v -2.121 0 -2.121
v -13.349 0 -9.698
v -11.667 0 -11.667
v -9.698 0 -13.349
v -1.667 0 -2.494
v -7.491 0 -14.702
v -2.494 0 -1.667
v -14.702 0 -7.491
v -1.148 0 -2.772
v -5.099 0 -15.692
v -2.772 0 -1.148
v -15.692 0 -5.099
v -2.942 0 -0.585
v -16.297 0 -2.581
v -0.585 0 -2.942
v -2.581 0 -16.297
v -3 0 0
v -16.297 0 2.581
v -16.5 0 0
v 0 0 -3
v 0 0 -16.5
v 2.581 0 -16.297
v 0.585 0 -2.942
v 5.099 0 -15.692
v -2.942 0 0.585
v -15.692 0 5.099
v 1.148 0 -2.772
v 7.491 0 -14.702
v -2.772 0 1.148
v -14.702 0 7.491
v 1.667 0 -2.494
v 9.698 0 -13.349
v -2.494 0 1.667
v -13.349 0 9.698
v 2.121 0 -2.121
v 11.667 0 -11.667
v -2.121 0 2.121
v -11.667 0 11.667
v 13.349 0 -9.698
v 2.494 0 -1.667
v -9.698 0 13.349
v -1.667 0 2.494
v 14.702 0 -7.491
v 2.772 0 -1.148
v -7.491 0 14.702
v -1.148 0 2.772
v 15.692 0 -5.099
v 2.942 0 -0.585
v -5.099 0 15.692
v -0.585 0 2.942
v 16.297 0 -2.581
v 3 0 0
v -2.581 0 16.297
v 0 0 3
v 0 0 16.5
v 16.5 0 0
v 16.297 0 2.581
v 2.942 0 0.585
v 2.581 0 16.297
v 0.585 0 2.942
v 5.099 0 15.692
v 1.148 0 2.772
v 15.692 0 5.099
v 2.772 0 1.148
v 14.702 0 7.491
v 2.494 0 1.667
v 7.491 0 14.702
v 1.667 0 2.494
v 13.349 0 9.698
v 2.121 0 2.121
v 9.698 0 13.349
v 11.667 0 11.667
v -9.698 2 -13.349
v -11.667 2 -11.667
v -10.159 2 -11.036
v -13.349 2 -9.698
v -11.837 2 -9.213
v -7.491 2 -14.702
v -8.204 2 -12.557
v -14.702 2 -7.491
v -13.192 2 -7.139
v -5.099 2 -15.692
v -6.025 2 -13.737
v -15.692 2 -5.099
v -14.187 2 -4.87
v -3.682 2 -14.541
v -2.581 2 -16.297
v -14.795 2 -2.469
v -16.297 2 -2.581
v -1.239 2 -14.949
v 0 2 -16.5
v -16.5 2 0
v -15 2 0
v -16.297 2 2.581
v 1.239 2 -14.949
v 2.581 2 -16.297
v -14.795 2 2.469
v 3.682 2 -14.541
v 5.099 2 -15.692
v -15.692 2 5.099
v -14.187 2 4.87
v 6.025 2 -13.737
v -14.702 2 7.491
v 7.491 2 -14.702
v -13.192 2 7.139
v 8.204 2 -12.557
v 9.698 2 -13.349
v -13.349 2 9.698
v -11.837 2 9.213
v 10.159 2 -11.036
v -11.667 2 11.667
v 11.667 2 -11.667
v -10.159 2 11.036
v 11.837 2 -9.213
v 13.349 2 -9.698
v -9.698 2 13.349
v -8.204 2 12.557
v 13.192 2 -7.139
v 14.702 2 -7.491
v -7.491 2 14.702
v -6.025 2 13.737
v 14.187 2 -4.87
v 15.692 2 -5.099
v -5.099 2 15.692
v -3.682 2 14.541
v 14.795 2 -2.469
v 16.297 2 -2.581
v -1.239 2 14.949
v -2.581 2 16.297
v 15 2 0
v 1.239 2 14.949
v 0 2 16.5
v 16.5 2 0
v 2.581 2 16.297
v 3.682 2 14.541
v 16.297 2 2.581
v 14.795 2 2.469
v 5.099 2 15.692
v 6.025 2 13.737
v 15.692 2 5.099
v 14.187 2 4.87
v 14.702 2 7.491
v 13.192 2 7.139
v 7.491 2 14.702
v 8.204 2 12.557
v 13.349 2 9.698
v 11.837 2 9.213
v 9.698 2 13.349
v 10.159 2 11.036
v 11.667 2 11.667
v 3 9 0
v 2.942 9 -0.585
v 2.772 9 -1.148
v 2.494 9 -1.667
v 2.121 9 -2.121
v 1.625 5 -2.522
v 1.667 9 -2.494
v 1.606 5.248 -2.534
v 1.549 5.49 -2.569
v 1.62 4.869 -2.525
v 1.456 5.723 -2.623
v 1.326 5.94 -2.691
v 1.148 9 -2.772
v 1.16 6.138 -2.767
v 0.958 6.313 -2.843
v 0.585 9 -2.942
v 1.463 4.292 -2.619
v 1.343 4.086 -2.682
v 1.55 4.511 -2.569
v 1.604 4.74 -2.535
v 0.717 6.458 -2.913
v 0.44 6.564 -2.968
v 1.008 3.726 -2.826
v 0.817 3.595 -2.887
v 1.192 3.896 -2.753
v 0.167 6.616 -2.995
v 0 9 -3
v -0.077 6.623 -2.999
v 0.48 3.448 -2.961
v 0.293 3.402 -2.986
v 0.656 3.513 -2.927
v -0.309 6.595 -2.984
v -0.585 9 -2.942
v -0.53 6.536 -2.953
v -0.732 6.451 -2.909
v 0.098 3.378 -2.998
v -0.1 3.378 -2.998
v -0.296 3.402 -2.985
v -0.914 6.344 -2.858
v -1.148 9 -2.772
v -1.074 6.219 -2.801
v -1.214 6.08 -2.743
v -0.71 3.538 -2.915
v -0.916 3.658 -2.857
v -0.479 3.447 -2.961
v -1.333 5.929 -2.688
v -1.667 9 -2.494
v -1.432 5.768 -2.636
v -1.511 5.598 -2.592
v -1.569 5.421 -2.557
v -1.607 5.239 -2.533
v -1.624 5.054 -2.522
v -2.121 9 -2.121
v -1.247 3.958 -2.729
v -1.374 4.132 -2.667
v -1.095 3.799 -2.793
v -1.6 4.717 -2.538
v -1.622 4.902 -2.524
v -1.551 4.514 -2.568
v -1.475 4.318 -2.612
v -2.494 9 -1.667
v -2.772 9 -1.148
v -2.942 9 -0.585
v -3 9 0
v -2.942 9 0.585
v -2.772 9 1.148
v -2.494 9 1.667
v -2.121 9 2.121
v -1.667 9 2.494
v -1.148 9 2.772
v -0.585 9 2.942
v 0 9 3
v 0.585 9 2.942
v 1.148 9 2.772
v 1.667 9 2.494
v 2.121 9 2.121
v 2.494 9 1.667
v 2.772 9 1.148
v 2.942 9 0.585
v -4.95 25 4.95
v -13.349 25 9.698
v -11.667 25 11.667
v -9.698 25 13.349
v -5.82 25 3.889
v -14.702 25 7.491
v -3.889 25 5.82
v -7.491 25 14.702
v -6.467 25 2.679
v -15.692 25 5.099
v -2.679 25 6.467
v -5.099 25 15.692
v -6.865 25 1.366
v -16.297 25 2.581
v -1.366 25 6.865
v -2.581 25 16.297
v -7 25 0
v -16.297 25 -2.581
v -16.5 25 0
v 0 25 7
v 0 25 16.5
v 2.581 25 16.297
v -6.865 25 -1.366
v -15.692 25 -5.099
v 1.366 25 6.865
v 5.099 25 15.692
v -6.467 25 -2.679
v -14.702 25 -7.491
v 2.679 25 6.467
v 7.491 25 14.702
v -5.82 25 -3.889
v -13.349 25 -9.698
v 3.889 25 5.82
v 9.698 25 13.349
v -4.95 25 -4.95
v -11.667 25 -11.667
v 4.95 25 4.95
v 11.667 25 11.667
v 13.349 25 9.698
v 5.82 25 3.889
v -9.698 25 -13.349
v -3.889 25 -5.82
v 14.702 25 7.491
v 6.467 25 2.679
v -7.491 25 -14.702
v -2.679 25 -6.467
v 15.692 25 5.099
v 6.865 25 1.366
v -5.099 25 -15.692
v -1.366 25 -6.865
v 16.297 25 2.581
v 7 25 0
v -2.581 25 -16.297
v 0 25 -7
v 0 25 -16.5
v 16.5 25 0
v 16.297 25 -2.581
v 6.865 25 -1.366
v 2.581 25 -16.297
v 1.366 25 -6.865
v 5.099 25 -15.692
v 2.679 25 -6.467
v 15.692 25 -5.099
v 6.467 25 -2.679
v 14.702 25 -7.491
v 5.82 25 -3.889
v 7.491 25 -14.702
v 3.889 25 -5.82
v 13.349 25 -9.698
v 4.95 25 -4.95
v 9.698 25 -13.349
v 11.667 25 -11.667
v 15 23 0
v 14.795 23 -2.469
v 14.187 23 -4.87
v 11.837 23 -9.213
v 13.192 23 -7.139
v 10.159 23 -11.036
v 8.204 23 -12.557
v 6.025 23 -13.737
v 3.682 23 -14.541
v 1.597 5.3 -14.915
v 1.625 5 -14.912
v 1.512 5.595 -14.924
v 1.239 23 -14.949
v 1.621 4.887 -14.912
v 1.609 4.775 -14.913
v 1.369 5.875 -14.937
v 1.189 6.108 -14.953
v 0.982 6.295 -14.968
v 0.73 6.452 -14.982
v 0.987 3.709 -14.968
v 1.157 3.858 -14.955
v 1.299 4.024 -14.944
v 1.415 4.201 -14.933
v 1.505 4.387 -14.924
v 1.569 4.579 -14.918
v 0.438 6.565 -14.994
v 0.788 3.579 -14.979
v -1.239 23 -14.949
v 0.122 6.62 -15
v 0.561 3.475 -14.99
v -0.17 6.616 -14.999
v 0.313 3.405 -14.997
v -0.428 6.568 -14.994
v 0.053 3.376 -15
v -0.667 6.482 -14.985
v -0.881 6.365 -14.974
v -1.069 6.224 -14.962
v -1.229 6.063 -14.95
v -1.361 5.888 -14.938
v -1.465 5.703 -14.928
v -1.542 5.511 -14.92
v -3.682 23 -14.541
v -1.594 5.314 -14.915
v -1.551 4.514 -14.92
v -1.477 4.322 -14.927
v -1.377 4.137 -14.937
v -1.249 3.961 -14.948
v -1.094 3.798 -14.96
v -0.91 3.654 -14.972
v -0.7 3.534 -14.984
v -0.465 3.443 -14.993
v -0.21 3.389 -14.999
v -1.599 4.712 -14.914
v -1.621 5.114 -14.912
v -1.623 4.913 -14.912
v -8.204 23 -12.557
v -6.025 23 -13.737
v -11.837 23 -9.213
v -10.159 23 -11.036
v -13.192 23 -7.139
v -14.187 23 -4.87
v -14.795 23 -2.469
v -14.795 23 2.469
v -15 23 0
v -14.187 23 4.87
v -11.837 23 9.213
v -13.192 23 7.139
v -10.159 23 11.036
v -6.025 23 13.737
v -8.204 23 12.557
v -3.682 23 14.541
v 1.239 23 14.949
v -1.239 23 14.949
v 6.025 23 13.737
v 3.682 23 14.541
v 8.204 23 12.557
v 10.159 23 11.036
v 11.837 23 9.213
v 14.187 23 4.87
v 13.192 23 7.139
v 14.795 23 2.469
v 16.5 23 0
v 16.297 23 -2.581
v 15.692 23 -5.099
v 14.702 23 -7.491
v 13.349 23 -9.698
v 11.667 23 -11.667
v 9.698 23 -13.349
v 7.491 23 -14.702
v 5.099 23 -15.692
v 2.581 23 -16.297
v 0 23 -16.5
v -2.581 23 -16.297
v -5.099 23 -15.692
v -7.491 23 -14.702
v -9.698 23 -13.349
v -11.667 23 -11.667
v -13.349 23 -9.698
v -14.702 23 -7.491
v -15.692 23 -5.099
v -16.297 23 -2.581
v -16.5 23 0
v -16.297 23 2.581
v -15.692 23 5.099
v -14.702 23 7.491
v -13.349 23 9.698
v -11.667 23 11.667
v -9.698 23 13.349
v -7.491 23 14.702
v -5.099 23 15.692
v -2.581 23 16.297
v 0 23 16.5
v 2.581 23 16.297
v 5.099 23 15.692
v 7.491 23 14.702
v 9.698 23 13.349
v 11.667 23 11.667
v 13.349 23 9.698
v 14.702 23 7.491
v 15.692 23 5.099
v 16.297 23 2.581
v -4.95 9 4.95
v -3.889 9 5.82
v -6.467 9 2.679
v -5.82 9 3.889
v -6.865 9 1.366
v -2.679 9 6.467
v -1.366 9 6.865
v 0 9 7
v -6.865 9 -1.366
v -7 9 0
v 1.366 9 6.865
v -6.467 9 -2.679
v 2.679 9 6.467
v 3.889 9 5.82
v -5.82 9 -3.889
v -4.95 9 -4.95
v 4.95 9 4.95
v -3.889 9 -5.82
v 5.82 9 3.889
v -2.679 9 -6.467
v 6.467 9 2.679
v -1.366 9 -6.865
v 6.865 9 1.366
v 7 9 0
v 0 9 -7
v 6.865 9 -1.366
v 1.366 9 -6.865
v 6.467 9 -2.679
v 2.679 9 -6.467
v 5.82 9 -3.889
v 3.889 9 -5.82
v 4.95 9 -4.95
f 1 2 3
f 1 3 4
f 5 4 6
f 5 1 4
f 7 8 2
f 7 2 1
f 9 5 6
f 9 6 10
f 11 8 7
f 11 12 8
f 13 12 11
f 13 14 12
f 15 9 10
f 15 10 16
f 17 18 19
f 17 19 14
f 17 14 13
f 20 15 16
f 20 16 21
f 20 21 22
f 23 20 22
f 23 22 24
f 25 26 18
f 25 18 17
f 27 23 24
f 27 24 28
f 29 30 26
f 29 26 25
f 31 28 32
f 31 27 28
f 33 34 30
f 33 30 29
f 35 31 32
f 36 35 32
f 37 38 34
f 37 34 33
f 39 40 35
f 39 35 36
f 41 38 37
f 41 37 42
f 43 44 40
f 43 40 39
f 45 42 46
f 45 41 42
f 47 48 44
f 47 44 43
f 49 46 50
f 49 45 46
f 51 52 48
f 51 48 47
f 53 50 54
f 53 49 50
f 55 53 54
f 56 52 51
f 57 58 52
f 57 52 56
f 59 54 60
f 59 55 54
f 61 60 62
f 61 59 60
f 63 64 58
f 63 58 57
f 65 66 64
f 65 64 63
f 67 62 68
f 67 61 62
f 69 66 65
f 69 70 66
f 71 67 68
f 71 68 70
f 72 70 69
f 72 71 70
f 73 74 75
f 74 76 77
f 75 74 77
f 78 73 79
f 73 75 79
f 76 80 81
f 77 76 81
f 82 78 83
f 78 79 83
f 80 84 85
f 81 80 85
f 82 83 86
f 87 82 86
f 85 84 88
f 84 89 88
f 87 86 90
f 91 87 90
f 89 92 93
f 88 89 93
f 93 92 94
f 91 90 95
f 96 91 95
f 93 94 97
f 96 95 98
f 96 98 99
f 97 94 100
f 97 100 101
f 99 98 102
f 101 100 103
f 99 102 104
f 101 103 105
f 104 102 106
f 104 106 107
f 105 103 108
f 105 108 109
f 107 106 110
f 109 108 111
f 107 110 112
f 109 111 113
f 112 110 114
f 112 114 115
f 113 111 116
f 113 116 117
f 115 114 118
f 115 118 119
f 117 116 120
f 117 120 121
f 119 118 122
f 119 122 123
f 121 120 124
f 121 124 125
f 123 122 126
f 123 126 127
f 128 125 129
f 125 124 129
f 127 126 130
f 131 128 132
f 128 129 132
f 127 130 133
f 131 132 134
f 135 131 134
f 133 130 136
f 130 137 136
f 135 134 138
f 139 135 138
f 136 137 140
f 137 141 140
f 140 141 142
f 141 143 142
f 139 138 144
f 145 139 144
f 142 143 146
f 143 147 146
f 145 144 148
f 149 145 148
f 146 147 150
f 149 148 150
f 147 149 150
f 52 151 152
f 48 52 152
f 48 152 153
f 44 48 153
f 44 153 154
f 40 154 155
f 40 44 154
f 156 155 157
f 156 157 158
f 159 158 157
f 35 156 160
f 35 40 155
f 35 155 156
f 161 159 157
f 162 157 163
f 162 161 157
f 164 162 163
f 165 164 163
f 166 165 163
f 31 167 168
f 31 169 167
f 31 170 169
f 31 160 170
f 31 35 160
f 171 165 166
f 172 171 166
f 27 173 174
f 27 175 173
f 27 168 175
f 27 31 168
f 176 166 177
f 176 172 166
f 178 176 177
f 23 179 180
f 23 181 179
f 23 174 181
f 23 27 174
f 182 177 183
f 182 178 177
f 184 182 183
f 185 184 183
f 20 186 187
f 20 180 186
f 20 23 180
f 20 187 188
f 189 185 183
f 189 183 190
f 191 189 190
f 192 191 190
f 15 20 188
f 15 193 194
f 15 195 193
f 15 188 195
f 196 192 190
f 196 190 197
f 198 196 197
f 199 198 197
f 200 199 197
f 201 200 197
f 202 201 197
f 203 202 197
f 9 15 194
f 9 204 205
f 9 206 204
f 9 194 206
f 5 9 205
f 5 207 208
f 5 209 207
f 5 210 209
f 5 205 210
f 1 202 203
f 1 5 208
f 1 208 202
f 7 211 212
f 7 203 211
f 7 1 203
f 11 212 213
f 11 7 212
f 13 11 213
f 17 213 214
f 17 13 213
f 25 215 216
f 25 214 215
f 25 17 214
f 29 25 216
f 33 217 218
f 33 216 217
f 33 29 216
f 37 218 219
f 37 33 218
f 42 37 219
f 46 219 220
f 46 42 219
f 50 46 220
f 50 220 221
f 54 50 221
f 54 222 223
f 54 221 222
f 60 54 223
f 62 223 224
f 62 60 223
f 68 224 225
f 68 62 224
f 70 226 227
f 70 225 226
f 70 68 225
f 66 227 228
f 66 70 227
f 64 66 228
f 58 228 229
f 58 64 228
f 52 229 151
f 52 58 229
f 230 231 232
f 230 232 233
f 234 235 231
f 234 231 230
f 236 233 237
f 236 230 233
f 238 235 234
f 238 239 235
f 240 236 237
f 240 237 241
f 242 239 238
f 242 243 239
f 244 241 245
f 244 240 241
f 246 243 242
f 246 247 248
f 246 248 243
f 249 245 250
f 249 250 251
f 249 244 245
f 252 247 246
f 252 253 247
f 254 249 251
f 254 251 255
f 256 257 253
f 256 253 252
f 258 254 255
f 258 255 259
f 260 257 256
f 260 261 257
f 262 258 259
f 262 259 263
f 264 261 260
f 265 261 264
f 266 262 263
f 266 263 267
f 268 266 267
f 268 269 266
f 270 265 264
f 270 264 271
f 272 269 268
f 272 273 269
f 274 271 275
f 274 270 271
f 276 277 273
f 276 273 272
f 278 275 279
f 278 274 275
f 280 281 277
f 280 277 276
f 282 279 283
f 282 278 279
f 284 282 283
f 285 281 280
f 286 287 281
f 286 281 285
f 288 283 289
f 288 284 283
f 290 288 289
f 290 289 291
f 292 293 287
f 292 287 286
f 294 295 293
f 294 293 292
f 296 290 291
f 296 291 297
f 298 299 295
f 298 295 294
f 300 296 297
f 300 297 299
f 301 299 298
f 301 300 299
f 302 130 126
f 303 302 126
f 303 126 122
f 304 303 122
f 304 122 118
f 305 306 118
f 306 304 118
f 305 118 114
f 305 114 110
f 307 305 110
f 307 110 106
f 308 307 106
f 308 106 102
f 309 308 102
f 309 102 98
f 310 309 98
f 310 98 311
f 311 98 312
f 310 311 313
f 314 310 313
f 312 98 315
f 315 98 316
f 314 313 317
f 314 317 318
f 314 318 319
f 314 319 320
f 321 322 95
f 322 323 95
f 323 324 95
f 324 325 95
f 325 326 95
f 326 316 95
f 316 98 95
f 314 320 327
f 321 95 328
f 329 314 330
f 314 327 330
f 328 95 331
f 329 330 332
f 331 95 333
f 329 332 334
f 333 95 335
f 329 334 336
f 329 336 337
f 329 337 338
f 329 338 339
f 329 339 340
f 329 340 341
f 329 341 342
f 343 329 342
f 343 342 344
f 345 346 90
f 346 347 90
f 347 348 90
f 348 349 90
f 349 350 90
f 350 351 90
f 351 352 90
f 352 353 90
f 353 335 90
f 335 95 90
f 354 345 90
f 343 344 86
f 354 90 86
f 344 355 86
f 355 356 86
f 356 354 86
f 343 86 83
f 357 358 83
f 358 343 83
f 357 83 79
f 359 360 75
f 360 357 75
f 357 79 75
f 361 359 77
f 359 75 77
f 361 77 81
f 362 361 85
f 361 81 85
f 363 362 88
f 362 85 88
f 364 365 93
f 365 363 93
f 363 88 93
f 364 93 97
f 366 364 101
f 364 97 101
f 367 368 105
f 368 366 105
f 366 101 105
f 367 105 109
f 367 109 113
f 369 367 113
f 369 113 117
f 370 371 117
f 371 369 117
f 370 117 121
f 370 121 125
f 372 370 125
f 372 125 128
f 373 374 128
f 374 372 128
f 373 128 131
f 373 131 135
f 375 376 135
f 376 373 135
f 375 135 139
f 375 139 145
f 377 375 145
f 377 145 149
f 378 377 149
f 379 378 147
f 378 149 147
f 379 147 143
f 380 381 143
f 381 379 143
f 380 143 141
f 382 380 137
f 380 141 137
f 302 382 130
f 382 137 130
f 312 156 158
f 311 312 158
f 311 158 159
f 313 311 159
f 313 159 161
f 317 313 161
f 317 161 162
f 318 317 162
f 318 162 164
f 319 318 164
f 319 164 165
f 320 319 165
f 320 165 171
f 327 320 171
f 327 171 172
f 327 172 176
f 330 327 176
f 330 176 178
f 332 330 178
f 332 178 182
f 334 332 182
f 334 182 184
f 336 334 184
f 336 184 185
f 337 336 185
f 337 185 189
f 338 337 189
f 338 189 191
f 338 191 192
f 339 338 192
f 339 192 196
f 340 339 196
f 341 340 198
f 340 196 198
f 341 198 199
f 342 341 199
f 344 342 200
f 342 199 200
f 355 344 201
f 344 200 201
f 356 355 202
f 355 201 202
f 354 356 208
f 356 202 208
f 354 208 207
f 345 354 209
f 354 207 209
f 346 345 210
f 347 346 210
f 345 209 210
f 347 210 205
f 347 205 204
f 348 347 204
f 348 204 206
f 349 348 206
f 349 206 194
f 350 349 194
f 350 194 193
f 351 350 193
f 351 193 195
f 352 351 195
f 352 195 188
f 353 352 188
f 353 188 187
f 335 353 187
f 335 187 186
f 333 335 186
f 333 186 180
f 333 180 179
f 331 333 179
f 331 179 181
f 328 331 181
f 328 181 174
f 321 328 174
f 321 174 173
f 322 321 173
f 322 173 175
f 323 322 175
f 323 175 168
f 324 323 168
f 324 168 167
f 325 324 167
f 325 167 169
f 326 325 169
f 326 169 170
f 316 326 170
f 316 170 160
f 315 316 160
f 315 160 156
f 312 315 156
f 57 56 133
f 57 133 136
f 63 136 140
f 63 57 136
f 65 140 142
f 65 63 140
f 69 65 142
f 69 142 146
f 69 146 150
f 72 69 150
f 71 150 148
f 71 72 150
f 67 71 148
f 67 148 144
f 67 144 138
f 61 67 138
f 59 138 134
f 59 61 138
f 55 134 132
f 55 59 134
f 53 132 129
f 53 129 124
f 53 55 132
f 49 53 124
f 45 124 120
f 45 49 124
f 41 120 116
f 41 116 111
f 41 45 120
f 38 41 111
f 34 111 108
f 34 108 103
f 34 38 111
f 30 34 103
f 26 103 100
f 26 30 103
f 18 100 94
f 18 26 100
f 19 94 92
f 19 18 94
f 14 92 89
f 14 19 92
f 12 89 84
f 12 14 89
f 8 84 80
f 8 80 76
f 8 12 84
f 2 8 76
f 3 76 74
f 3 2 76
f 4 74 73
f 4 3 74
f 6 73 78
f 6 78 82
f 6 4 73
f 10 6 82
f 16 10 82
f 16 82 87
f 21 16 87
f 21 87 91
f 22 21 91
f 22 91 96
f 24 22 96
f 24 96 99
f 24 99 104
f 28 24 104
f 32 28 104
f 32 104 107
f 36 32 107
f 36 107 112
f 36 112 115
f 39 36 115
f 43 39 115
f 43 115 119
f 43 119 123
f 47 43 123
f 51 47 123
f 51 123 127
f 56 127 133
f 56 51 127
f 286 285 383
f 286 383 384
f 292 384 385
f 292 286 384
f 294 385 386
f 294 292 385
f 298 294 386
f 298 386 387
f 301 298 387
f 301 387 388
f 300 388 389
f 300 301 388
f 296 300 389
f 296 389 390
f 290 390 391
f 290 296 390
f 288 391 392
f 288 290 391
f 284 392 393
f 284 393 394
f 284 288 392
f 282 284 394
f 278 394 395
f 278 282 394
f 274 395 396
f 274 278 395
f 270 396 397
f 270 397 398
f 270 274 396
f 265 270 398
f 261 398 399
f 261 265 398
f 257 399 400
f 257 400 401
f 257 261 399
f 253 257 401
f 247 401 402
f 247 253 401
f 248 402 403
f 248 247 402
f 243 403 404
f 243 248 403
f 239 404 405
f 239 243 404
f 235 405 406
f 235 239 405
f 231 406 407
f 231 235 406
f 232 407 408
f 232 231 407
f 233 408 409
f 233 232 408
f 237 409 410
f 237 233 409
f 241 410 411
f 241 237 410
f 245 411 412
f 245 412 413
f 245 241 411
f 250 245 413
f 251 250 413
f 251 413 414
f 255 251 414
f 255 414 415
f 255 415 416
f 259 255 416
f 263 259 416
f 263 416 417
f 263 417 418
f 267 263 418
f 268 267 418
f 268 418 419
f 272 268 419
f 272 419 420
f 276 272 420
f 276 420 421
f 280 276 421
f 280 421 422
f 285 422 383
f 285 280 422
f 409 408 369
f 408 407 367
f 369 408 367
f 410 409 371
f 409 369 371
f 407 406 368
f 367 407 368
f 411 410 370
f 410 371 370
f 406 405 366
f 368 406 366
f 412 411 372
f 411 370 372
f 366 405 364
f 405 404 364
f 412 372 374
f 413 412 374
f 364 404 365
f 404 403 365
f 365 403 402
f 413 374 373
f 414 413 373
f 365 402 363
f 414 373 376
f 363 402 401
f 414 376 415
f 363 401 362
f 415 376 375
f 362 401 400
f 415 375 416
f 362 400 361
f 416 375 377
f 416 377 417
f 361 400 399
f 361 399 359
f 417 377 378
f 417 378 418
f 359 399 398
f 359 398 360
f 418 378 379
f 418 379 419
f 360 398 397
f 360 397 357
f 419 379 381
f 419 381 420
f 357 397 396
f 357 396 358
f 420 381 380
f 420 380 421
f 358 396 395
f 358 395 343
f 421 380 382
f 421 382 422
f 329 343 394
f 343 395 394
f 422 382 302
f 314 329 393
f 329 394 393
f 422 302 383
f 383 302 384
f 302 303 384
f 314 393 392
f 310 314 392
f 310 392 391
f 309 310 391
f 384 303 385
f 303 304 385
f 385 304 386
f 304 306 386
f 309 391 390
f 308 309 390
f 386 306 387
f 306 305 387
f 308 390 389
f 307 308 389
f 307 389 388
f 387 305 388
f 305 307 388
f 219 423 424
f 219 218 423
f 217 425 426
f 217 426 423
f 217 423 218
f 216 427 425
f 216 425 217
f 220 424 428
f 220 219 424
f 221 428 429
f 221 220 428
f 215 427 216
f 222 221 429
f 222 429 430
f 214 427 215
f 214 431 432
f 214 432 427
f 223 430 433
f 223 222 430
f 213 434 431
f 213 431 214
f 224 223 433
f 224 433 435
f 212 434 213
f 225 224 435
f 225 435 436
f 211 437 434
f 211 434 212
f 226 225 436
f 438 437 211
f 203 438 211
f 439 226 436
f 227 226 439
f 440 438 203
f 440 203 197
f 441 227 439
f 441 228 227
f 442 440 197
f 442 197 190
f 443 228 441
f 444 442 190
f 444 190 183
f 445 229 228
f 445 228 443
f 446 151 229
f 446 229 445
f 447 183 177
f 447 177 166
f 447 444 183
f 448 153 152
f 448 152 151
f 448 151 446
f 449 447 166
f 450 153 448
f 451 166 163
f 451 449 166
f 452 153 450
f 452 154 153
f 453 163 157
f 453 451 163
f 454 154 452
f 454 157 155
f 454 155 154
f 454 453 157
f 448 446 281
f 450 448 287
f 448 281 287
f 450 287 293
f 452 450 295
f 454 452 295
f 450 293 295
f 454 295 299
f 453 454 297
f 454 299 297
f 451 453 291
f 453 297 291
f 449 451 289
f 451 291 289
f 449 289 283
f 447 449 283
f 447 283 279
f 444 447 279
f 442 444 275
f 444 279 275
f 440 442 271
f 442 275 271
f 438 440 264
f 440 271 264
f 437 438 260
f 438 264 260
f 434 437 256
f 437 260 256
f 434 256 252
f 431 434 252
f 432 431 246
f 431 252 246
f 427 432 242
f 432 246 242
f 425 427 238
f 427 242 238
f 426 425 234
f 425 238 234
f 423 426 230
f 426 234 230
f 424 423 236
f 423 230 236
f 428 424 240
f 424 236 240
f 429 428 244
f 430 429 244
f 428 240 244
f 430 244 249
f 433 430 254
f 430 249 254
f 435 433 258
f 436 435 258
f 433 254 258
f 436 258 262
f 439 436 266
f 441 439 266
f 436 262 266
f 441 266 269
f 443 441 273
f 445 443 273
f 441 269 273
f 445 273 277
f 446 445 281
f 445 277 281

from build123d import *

# Parameters (mm, degrees)
CROQUIS1_R              = 15
CROQUIS1_R_2            = 3
SALIENTE_EXTRUIR1_DEPTH = 25
CROQUIS2_R              = 16.5
CROQUIS2_R_2            = 3
SALIENTE_EXTRUIR2_DEPTH = 2
CROQUIS3_R              = 16.5
CROQUIS3_R_2            = 3
SALIENTE_EXTRUIR3_DEPTH = 2
CORTAR_EXTRUIR1_REACH   = 18.5
CROQUIS4_R              = 1.625
CROQUIS5_R              = 7
CORTAR_EXTRUIR2_DEPTH   = 16


with BuildPart() as part:
    # Croquis1 → Saliente-Extruir1 (new body)
    with BuildSketch(Plane(origin=(0, 0, 0), x_dir=(1, 0, 0), z_dir=(0, 1, 0))):
        Circle(CROQUIS1_R)
        Circle(CROQUIS1_R_2, mode=Mode.SUBTRACT)
    extrude(amount=SALIENTE_EXTRUIR1_DEPTH)

    # Croquis2 → Saliente-Extruir2 (add)
    with BuildSketch(Plane.XZ):
        Circle(CROQUIS2_R)
        Circle(CROQUIS2_R_2, mode=Mode.SUBTRACT)
    extrude(amount=-SALIENTE_EXTRUIR2_DEPTH)

    # Croquis3 → Saliente-Extruir3 (add)
    with BuildSketch(Plane(origin=(0, 25, 0), x_dir=(1, 0, 0), z_dir=(0, 1, 0))):
        Circle(CROQUIS3_R)
        Circle(CROQUIS3_R_2, mode=Mode.SUBTRACT)
    extrude(amount=-SALIENTE_EXTRUIR3_DEPTH)

    # Croquis4 → Cortar-Extruir1 (cut, up to next)
    with BuildSketch(Plane.XY, mode=Mode.PRIVATE) as cortar_extruir1_sk1:
        with Locations((0, 5)):
            Circle(CROQUIS4_R)
    cortar_extruir1_tool1 = extrude(cortar_extruir1_sk1.sketch, amount=-CORTAR_EXTRUIR1_REACH, mode=Mode.PRIVATE) & part.part
    add(cortar_extruir1_tool1.solids().sort_by_distance((0, 5, 0))[0], mode=Mode.SUBTRACT)

    # Croquis5 → Cortar-Extruir2 (cut)
    with BuildSketch(Plane(origin=(0, 25, 0), x_dir=(1, 0, 0), z_dir=(0, 1, 0))):
        Circle(CROQUIS5_R)
    extrude(amount=-CORTAR_EXTRUIR2_DEPTH, mode=Mode.SUBTRACT)


solid = part.part
